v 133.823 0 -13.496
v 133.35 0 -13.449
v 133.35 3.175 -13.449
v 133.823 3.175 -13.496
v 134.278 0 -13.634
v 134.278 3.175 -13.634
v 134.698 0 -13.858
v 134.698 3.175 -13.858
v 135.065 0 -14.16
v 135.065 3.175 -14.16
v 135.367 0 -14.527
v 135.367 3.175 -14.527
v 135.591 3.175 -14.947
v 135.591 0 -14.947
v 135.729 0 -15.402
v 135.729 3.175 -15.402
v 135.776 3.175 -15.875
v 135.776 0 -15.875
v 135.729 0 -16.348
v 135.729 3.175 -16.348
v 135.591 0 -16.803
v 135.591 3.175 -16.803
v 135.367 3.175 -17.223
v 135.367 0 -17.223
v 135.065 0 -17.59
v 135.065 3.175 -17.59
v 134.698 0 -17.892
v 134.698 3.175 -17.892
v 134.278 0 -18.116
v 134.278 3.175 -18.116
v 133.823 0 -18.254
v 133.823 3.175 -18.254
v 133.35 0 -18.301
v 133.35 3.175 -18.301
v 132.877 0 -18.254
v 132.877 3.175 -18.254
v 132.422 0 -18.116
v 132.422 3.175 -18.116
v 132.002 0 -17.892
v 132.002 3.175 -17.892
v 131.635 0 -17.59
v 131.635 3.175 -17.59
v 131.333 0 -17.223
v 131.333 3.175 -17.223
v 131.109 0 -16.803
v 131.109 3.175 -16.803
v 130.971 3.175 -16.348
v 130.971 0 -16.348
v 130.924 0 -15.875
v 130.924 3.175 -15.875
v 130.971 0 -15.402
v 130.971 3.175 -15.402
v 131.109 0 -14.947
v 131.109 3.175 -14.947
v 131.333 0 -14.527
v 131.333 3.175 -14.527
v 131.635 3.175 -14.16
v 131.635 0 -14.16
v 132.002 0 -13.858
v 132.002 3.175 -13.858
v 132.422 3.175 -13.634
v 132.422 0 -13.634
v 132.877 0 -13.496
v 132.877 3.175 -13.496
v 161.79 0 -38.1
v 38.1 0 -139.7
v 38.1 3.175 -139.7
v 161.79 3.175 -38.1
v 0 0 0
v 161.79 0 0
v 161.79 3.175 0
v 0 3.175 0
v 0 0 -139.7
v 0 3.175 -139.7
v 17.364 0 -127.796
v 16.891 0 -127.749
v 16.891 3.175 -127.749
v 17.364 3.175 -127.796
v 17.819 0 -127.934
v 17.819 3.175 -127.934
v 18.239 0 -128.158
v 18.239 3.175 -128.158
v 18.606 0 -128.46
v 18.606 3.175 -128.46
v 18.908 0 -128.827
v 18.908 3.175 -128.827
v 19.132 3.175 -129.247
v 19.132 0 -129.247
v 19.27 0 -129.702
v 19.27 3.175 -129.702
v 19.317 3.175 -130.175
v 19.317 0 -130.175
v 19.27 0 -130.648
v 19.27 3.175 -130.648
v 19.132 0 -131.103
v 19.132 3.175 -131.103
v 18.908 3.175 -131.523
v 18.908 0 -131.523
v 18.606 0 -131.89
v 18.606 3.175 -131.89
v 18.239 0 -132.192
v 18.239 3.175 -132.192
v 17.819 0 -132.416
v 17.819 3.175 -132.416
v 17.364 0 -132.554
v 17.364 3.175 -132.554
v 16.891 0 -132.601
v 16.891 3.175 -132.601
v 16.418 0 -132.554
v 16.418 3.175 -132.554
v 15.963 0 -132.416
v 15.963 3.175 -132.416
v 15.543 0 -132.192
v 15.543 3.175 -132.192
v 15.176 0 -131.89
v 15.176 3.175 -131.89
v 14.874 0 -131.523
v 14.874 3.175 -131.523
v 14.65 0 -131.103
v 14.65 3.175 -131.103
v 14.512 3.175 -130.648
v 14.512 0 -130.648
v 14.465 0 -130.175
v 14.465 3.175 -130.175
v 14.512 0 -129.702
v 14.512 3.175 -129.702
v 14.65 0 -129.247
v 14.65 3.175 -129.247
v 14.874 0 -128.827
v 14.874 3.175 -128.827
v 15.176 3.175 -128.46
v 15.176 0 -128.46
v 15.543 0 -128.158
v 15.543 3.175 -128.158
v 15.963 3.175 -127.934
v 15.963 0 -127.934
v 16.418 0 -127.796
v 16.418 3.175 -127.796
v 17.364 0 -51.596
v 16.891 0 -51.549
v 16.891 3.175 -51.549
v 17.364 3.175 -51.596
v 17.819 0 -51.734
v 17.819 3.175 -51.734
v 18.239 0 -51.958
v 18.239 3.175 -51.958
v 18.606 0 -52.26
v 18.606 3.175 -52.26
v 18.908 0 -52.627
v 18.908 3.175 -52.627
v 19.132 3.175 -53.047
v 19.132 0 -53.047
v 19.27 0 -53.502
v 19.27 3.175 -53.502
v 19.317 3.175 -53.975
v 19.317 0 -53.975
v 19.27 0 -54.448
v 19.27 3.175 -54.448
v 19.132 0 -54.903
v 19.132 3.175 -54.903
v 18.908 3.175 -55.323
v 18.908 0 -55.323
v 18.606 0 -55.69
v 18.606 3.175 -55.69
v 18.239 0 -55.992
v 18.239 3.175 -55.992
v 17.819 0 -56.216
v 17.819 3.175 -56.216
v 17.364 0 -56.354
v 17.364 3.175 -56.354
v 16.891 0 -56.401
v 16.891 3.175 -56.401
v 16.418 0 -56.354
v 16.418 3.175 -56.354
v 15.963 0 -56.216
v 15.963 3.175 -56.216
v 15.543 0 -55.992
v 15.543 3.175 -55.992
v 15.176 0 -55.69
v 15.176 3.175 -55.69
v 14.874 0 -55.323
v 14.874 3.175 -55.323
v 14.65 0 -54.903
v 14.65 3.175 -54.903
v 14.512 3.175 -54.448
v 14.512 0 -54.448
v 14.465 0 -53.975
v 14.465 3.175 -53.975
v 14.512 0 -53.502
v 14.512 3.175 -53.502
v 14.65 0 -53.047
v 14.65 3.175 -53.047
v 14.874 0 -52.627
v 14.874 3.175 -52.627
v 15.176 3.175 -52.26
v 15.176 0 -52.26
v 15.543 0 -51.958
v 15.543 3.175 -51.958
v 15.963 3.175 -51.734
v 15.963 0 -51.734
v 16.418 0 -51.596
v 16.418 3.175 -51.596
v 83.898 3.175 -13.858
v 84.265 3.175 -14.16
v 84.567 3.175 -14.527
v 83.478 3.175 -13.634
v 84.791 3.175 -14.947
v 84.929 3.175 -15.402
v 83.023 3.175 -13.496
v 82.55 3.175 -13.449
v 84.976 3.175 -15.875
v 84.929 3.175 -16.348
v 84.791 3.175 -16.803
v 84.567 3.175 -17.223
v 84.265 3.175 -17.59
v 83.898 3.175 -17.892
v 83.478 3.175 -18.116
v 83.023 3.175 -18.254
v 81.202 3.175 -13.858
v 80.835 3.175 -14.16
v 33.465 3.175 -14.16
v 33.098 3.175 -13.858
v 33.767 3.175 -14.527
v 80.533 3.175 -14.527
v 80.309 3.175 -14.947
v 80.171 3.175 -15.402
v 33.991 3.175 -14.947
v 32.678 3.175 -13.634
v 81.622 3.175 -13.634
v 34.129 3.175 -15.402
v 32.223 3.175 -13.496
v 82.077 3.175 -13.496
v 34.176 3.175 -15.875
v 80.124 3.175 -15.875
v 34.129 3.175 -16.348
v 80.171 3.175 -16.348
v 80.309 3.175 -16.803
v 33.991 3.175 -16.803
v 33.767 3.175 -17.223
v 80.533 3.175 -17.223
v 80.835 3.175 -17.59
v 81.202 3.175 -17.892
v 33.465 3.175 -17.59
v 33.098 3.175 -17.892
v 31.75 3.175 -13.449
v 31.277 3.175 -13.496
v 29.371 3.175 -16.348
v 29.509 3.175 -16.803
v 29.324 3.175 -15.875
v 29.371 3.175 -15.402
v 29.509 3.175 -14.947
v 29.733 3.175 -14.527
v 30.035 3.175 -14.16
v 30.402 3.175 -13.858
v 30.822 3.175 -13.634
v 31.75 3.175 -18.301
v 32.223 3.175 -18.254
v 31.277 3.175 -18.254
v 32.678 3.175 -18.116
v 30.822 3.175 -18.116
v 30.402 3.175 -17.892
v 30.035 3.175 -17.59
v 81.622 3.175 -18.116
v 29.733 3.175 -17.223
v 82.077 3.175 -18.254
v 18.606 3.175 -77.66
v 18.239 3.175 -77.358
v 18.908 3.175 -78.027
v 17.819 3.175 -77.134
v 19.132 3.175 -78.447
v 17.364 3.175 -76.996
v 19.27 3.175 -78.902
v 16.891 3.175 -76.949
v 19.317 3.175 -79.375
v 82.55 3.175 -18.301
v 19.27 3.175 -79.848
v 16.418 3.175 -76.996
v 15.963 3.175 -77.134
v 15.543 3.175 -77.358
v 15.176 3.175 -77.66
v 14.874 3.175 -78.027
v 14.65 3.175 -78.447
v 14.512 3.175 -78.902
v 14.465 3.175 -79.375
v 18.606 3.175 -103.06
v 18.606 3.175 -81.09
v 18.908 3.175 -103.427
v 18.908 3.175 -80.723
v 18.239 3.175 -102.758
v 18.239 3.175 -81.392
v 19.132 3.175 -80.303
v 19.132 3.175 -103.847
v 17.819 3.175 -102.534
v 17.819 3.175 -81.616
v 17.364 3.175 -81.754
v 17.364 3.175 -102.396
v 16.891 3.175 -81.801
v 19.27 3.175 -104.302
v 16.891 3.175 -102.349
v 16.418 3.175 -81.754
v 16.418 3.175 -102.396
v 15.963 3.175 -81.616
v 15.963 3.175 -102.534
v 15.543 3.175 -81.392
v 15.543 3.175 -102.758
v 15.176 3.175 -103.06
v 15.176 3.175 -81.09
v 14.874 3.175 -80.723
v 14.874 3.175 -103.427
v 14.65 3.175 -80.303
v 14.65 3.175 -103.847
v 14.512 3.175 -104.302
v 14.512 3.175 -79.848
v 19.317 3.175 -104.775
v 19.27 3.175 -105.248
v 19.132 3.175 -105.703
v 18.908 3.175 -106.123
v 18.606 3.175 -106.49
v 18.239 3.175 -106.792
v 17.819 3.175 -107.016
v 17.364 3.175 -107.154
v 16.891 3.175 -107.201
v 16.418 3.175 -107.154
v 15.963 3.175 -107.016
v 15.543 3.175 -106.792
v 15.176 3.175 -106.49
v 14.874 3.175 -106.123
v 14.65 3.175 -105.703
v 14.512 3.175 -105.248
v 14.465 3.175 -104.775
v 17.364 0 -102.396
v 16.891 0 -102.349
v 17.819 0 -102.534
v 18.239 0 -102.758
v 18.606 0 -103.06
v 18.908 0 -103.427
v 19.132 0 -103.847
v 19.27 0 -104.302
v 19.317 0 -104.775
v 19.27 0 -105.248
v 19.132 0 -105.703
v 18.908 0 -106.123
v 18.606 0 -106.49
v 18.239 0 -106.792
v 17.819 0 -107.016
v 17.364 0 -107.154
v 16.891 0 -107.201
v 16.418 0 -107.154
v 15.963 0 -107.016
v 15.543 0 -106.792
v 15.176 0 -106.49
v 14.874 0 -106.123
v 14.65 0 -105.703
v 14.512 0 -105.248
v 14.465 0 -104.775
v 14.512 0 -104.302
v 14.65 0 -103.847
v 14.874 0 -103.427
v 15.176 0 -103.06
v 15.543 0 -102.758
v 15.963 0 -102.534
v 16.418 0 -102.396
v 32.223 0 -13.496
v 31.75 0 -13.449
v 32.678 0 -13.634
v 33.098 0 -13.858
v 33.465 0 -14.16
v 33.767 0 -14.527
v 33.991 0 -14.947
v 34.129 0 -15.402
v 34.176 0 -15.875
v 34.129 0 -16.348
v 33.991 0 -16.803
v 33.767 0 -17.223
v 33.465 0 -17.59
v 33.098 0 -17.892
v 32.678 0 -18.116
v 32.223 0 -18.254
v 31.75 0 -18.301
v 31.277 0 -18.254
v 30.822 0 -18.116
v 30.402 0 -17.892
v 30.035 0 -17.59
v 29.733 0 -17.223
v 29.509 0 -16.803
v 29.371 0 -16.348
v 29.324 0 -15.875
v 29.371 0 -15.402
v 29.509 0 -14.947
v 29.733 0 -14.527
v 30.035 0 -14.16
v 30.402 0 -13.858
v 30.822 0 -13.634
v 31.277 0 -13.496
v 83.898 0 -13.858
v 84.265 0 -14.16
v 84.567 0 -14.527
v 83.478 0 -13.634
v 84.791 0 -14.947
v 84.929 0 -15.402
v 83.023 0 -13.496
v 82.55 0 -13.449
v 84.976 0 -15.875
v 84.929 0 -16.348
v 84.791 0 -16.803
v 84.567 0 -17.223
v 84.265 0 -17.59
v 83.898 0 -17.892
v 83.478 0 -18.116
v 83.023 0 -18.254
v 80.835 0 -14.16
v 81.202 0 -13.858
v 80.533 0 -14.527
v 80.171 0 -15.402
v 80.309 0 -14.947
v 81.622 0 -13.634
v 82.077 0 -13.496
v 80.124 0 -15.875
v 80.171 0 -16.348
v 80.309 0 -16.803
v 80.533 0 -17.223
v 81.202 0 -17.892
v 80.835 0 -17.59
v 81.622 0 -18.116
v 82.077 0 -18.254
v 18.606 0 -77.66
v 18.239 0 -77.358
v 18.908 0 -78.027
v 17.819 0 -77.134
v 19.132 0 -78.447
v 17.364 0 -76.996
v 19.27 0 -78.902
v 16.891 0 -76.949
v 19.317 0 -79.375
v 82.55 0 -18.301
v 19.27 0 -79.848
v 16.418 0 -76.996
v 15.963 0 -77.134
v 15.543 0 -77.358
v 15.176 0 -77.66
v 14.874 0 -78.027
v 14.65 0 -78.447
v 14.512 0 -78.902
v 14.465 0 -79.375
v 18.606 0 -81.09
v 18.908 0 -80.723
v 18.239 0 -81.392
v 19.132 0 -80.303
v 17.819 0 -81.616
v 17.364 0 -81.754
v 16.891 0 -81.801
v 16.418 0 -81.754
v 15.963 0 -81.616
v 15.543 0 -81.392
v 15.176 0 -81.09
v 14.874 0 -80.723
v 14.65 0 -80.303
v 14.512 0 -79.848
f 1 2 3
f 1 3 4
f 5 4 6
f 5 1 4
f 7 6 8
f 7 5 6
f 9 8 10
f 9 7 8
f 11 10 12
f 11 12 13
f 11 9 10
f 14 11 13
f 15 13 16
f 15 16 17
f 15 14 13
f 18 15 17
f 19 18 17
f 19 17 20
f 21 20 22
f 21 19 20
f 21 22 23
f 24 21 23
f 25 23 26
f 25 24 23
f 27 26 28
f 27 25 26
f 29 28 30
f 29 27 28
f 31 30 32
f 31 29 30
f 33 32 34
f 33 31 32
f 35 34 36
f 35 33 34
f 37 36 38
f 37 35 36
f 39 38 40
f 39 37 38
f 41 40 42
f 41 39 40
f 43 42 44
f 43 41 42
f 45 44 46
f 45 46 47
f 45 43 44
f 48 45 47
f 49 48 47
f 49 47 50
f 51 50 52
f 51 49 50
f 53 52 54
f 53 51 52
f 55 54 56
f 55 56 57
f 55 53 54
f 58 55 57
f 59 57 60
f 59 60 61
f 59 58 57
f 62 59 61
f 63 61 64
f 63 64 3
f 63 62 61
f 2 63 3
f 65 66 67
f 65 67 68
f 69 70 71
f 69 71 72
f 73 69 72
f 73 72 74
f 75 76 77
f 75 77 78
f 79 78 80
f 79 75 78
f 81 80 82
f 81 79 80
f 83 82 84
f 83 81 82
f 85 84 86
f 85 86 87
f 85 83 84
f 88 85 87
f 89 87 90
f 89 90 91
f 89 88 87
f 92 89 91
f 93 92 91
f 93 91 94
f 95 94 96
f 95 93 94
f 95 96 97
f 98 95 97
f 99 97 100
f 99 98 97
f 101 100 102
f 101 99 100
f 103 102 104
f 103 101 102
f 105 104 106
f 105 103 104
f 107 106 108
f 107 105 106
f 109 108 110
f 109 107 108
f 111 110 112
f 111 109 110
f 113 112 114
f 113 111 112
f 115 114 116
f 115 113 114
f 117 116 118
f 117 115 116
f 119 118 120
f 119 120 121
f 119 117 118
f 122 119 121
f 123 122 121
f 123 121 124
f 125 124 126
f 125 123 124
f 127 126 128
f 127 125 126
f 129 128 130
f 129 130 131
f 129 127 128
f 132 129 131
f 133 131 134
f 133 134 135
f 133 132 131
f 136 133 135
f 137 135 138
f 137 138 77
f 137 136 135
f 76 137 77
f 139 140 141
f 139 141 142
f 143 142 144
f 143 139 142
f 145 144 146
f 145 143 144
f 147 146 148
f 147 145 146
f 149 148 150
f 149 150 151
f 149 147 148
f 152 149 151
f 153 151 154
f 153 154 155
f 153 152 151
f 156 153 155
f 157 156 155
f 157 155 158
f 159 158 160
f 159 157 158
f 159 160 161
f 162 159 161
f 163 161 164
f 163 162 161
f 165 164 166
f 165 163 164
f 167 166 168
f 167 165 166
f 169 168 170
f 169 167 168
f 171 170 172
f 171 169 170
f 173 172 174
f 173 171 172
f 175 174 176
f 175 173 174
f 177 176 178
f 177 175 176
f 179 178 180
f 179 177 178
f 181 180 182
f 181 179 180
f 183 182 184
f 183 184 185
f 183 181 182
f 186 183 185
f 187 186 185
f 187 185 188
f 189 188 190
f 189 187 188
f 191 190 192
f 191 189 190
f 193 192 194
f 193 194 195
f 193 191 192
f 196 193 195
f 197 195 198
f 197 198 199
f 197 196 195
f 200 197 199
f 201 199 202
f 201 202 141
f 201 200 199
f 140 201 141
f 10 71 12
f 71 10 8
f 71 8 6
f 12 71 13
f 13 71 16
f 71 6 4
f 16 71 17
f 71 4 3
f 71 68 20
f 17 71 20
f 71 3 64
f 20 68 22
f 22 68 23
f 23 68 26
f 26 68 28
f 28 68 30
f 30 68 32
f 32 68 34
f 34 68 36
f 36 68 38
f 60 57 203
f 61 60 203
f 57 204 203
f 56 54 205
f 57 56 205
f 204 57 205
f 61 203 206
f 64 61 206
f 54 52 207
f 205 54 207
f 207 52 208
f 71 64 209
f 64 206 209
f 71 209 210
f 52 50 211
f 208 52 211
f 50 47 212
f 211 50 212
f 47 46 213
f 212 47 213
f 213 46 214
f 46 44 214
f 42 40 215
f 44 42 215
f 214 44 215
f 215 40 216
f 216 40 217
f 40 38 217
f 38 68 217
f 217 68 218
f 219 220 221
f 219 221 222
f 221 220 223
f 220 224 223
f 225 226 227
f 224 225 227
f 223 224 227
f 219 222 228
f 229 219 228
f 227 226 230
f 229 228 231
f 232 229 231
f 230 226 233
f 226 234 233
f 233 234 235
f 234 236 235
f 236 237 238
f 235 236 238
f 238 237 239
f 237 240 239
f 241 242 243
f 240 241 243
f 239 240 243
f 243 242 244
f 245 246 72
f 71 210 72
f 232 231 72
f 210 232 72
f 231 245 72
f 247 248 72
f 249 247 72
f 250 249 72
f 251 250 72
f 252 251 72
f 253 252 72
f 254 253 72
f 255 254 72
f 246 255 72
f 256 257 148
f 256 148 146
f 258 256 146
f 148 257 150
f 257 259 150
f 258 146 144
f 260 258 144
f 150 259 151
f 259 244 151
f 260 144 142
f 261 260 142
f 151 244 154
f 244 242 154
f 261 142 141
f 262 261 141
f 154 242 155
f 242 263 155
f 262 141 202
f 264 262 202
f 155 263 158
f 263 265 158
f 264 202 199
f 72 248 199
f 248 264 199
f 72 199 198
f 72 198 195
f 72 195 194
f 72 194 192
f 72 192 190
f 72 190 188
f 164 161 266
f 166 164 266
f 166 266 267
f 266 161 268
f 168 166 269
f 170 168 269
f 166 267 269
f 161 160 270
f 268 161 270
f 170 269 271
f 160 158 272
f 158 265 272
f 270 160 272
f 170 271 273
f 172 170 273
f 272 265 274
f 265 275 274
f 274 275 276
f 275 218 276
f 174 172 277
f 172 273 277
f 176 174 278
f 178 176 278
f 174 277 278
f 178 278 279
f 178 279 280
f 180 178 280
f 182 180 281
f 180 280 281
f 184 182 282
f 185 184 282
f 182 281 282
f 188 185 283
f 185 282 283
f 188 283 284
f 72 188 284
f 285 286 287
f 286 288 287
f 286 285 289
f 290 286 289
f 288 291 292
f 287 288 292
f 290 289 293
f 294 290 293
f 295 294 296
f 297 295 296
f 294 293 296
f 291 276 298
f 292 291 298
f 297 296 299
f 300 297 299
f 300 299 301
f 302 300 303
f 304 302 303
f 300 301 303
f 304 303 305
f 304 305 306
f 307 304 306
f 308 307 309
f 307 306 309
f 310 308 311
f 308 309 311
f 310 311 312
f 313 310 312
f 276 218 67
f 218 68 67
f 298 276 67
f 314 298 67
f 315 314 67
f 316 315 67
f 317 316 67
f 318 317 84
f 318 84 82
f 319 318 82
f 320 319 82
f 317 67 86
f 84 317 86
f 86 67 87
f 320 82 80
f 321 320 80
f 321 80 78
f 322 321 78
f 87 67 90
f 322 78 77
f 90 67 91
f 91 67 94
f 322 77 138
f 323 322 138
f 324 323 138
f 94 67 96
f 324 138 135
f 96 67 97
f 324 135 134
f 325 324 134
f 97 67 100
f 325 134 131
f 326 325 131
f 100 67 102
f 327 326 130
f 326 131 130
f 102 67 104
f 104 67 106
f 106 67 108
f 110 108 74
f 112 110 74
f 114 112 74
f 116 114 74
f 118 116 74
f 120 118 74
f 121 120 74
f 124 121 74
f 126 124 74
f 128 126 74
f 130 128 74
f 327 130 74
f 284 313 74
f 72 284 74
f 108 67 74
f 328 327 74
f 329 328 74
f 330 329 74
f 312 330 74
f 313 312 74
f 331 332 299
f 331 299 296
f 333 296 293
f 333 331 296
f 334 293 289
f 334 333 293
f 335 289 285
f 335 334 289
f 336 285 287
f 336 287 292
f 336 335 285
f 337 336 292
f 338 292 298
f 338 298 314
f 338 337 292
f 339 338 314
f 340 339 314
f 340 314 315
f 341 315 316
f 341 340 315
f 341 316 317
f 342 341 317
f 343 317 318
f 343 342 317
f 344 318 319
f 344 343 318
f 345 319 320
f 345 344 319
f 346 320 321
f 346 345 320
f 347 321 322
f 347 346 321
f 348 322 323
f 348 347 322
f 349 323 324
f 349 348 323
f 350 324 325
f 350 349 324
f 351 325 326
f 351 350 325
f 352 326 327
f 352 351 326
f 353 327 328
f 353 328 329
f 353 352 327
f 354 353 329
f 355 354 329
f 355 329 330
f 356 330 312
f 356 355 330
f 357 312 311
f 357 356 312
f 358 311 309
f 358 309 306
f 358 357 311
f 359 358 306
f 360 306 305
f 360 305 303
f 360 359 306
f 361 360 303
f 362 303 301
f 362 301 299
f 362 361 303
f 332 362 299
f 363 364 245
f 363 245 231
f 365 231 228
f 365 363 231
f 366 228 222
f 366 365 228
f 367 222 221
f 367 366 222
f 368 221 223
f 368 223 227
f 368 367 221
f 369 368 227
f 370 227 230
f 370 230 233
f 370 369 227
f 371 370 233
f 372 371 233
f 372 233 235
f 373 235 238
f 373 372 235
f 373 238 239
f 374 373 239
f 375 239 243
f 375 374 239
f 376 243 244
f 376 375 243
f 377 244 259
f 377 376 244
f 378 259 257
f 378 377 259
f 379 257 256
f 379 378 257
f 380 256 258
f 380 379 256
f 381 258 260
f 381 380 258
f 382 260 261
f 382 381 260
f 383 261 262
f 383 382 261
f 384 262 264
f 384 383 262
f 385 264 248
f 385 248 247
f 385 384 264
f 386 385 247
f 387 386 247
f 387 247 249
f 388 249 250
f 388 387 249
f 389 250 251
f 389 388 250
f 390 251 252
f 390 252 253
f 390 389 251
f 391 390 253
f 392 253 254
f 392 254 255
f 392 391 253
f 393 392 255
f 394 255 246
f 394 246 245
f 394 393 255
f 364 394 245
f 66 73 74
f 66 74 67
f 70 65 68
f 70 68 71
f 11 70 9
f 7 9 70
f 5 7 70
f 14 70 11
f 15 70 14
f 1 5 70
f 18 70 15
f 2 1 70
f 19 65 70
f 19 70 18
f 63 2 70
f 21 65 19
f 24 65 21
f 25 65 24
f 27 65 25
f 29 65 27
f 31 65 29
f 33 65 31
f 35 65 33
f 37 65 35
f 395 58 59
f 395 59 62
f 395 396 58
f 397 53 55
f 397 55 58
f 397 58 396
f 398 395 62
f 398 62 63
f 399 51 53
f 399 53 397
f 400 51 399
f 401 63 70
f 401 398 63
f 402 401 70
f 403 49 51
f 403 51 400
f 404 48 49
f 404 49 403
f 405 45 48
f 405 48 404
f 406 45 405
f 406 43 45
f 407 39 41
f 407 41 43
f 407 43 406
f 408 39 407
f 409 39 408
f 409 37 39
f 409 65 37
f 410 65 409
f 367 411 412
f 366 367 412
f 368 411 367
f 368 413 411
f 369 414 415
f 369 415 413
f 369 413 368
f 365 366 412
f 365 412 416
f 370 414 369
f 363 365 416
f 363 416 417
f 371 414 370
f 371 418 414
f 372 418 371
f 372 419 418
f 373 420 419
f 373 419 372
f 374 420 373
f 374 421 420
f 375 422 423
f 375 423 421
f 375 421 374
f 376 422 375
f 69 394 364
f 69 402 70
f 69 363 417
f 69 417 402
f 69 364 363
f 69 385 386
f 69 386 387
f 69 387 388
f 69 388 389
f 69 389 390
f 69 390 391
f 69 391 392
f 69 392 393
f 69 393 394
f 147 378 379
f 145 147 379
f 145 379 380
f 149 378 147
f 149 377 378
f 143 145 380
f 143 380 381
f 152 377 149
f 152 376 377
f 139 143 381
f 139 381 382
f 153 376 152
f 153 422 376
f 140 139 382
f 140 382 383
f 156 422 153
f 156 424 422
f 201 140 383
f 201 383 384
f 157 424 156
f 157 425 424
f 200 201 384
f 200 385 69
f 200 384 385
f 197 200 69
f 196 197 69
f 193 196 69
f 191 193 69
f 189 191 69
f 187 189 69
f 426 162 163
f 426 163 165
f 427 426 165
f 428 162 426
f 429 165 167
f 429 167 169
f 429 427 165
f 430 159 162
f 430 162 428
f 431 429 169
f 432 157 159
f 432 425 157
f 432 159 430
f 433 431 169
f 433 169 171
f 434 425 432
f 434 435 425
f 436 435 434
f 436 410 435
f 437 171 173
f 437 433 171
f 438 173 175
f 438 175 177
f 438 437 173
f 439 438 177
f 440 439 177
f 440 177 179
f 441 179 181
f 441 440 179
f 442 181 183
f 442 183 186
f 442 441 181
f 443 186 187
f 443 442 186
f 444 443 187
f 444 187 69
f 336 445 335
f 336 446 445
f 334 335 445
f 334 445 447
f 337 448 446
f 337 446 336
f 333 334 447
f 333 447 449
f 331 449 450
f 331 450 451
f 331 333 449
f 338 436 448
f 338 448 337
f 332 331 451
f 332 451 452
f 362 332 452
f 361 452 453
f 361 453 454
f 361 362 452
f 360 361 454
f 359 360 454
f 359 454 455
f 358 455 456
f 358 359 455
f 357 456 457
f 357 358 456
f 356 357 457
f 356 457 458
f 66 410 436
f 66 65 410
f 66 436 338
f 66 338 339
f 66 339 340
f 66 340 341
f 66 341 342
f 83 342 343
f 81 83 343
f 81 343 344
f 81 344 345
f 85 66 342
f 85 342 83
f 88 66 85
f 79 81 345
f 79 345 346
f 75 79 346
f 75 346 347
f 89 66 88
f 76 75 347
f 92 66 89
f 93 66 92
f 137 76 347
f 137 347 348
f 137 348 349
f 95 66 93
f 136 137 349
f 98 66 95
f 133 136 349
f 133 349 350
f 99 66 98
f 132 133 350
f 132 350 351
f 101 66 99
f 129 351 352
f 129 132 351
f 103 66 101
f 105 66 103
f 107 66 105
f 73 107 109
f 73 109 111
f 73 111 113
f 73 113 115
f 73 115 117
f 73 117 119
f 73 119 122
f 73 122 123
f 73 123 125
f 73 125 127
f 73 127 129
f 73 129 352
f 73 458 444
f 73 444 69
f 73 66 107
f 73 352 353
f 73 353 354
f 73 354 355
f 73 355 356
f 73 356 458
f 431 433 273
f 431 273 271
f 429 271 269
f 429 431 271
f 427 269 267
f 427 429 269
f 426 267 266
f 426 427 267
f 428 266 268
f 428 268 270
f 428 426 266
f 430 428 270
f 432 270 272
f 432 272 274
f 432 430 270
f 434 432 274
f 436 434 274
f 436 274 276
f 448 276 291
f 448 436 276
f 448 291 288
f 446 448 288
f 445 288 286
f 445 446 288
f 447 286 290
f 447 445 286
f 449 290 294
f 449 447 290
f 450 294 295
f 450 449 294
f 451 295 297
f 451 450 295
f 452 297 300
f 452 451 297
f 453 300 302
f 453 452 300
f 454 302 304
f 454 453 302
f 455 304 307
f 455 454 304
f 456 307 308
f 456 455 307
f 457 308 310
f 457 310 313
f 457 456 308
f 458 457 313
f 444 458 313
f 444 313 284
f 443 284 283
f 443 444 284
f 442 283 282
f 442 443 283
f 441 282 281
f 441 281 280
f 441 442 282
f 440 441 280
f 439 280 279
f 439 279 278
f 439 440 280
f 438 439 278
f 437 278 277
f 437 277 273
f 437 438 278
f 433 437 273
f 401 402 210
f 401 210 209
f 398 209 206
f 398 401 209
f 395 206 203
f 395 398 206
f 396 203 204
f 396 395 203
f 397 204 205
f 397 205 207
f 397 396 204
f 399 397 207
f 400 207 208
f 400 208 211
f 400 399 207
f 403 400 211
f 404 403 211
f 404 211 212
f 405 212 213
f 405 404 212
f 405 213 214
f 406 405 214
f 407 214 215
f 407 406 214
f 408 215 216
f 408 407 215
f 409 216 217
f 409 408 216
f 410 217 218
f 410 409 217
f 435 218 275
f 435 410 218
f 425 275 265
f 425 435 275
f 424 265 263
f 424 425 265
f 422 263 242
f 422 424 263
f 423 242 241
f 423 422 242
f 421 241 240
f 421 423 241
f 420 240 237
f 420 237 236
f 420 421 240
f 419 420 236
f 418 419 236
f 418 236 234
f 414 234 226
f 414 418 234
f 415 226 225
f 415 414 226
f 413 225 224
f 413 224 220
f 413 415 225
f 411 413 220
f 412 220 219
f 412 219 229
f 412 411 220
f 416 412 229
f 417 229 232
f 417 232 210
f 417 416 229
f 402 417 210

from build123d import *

# Parameters (mm, degrees)
SKETCH1_R           = 2.4257
BOSS_EXTRUDE1_DEPTH = 3.175


with BuildPart() as part:
    # Sketch1 → Boss-Extrude1 (new body)
    with BuildSketch(Plane(origin=(0, 0, 0), x_dir=(1, 0, 0), z_dir=(0, 1, 0))):
        Polygon((0, 0), (0, 139.7), (38.1, 139.7), (161.789864335, 38.1), (161.789864335, 0), align=None)
        with Locations(Location((31.75, 15.875, 0), (0, 0, 270))):
            Circle(SKETCH1_R, mode=Mode.SUBTRACT)
        with Locations(Location((82.55, 15.875, 0), (0, 0, 270))):
            Circle(SKETCH1_R, mode=Mode.SUBTRACT)
        with Locations(Location((133.35, 15.875, 0), (0, 0, 270))):
            Circle(SKETCH1_R, mode=Mode.SUBTRACT)
        with Locations(Location((16.891, 53.975, 0), (0, 0, 270))):
            Circle(SKETCH1_R, mode=Mode.SUBTRACT)
        with Locations(Location((16.891, 79.375, 0), (0, 0, 270))):
            Circle(SKETCH1_R, mode=Mode.SUBTRACT)
        with Locations(Location((16.891, 104.775, 0), (0, 0, 270))):
            Circle(SKETCH1_R, mode=Mode.SUBTRACT)
        with Locations(Location((16.891, 130.175, 0), (0, 0, 270))):
            Circle(SKETCH1_R, mode=Mode.SUBTRACT)
    extrude(amount=BOSS_EXTRUDE1_DEPTH)


solid = part.part
